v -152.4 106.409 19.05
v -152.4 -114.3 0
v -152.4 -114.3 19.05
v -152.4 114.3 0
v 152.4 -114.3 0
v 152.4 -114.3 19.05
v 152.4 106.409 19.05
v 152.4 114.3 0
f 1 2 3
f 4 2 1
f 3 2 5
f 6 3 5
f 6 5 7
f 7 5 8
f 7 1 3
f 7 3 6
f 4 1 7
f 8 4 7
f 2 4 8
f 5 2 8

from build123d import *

# Parameters (mm, degrees)
F0_W     = 304.8
F0_H     = 228.6
F1_DEPTH = 19.05
F2_SIZE2 = 7.890758
F2_SIZE  = 19.04999


# Not quite as in the source:
# - a fillet or chamfer is up to 0.001 mm smaller than in the source, because OpenCascade refuses the exact size


with BuildPart() as f1:
    # F0 (on Top) → F1 (new body)
    with BuildSketch(Plane.XY):
        Rectangle(F0_W, F0_H)
    extrude(amount=F1_DEPTH)

    # F2 (size 19.05 and 7.8907683632 in the source; OpenCascade refuses exactly that, so slightly less here)
    f2_edges = [f1.edges().sort_by_distance(p)[0] for p in [
        (0, 114.3, 19.05),
    ]]
    f2_side = f1.faces().sort_by_distance((0, 114.3, 9.525))[0]
    chamfer(f2_edges, length=F2_SIZE, length2=F2_SIZE2, reference=f2_side)


solid = f1.part
